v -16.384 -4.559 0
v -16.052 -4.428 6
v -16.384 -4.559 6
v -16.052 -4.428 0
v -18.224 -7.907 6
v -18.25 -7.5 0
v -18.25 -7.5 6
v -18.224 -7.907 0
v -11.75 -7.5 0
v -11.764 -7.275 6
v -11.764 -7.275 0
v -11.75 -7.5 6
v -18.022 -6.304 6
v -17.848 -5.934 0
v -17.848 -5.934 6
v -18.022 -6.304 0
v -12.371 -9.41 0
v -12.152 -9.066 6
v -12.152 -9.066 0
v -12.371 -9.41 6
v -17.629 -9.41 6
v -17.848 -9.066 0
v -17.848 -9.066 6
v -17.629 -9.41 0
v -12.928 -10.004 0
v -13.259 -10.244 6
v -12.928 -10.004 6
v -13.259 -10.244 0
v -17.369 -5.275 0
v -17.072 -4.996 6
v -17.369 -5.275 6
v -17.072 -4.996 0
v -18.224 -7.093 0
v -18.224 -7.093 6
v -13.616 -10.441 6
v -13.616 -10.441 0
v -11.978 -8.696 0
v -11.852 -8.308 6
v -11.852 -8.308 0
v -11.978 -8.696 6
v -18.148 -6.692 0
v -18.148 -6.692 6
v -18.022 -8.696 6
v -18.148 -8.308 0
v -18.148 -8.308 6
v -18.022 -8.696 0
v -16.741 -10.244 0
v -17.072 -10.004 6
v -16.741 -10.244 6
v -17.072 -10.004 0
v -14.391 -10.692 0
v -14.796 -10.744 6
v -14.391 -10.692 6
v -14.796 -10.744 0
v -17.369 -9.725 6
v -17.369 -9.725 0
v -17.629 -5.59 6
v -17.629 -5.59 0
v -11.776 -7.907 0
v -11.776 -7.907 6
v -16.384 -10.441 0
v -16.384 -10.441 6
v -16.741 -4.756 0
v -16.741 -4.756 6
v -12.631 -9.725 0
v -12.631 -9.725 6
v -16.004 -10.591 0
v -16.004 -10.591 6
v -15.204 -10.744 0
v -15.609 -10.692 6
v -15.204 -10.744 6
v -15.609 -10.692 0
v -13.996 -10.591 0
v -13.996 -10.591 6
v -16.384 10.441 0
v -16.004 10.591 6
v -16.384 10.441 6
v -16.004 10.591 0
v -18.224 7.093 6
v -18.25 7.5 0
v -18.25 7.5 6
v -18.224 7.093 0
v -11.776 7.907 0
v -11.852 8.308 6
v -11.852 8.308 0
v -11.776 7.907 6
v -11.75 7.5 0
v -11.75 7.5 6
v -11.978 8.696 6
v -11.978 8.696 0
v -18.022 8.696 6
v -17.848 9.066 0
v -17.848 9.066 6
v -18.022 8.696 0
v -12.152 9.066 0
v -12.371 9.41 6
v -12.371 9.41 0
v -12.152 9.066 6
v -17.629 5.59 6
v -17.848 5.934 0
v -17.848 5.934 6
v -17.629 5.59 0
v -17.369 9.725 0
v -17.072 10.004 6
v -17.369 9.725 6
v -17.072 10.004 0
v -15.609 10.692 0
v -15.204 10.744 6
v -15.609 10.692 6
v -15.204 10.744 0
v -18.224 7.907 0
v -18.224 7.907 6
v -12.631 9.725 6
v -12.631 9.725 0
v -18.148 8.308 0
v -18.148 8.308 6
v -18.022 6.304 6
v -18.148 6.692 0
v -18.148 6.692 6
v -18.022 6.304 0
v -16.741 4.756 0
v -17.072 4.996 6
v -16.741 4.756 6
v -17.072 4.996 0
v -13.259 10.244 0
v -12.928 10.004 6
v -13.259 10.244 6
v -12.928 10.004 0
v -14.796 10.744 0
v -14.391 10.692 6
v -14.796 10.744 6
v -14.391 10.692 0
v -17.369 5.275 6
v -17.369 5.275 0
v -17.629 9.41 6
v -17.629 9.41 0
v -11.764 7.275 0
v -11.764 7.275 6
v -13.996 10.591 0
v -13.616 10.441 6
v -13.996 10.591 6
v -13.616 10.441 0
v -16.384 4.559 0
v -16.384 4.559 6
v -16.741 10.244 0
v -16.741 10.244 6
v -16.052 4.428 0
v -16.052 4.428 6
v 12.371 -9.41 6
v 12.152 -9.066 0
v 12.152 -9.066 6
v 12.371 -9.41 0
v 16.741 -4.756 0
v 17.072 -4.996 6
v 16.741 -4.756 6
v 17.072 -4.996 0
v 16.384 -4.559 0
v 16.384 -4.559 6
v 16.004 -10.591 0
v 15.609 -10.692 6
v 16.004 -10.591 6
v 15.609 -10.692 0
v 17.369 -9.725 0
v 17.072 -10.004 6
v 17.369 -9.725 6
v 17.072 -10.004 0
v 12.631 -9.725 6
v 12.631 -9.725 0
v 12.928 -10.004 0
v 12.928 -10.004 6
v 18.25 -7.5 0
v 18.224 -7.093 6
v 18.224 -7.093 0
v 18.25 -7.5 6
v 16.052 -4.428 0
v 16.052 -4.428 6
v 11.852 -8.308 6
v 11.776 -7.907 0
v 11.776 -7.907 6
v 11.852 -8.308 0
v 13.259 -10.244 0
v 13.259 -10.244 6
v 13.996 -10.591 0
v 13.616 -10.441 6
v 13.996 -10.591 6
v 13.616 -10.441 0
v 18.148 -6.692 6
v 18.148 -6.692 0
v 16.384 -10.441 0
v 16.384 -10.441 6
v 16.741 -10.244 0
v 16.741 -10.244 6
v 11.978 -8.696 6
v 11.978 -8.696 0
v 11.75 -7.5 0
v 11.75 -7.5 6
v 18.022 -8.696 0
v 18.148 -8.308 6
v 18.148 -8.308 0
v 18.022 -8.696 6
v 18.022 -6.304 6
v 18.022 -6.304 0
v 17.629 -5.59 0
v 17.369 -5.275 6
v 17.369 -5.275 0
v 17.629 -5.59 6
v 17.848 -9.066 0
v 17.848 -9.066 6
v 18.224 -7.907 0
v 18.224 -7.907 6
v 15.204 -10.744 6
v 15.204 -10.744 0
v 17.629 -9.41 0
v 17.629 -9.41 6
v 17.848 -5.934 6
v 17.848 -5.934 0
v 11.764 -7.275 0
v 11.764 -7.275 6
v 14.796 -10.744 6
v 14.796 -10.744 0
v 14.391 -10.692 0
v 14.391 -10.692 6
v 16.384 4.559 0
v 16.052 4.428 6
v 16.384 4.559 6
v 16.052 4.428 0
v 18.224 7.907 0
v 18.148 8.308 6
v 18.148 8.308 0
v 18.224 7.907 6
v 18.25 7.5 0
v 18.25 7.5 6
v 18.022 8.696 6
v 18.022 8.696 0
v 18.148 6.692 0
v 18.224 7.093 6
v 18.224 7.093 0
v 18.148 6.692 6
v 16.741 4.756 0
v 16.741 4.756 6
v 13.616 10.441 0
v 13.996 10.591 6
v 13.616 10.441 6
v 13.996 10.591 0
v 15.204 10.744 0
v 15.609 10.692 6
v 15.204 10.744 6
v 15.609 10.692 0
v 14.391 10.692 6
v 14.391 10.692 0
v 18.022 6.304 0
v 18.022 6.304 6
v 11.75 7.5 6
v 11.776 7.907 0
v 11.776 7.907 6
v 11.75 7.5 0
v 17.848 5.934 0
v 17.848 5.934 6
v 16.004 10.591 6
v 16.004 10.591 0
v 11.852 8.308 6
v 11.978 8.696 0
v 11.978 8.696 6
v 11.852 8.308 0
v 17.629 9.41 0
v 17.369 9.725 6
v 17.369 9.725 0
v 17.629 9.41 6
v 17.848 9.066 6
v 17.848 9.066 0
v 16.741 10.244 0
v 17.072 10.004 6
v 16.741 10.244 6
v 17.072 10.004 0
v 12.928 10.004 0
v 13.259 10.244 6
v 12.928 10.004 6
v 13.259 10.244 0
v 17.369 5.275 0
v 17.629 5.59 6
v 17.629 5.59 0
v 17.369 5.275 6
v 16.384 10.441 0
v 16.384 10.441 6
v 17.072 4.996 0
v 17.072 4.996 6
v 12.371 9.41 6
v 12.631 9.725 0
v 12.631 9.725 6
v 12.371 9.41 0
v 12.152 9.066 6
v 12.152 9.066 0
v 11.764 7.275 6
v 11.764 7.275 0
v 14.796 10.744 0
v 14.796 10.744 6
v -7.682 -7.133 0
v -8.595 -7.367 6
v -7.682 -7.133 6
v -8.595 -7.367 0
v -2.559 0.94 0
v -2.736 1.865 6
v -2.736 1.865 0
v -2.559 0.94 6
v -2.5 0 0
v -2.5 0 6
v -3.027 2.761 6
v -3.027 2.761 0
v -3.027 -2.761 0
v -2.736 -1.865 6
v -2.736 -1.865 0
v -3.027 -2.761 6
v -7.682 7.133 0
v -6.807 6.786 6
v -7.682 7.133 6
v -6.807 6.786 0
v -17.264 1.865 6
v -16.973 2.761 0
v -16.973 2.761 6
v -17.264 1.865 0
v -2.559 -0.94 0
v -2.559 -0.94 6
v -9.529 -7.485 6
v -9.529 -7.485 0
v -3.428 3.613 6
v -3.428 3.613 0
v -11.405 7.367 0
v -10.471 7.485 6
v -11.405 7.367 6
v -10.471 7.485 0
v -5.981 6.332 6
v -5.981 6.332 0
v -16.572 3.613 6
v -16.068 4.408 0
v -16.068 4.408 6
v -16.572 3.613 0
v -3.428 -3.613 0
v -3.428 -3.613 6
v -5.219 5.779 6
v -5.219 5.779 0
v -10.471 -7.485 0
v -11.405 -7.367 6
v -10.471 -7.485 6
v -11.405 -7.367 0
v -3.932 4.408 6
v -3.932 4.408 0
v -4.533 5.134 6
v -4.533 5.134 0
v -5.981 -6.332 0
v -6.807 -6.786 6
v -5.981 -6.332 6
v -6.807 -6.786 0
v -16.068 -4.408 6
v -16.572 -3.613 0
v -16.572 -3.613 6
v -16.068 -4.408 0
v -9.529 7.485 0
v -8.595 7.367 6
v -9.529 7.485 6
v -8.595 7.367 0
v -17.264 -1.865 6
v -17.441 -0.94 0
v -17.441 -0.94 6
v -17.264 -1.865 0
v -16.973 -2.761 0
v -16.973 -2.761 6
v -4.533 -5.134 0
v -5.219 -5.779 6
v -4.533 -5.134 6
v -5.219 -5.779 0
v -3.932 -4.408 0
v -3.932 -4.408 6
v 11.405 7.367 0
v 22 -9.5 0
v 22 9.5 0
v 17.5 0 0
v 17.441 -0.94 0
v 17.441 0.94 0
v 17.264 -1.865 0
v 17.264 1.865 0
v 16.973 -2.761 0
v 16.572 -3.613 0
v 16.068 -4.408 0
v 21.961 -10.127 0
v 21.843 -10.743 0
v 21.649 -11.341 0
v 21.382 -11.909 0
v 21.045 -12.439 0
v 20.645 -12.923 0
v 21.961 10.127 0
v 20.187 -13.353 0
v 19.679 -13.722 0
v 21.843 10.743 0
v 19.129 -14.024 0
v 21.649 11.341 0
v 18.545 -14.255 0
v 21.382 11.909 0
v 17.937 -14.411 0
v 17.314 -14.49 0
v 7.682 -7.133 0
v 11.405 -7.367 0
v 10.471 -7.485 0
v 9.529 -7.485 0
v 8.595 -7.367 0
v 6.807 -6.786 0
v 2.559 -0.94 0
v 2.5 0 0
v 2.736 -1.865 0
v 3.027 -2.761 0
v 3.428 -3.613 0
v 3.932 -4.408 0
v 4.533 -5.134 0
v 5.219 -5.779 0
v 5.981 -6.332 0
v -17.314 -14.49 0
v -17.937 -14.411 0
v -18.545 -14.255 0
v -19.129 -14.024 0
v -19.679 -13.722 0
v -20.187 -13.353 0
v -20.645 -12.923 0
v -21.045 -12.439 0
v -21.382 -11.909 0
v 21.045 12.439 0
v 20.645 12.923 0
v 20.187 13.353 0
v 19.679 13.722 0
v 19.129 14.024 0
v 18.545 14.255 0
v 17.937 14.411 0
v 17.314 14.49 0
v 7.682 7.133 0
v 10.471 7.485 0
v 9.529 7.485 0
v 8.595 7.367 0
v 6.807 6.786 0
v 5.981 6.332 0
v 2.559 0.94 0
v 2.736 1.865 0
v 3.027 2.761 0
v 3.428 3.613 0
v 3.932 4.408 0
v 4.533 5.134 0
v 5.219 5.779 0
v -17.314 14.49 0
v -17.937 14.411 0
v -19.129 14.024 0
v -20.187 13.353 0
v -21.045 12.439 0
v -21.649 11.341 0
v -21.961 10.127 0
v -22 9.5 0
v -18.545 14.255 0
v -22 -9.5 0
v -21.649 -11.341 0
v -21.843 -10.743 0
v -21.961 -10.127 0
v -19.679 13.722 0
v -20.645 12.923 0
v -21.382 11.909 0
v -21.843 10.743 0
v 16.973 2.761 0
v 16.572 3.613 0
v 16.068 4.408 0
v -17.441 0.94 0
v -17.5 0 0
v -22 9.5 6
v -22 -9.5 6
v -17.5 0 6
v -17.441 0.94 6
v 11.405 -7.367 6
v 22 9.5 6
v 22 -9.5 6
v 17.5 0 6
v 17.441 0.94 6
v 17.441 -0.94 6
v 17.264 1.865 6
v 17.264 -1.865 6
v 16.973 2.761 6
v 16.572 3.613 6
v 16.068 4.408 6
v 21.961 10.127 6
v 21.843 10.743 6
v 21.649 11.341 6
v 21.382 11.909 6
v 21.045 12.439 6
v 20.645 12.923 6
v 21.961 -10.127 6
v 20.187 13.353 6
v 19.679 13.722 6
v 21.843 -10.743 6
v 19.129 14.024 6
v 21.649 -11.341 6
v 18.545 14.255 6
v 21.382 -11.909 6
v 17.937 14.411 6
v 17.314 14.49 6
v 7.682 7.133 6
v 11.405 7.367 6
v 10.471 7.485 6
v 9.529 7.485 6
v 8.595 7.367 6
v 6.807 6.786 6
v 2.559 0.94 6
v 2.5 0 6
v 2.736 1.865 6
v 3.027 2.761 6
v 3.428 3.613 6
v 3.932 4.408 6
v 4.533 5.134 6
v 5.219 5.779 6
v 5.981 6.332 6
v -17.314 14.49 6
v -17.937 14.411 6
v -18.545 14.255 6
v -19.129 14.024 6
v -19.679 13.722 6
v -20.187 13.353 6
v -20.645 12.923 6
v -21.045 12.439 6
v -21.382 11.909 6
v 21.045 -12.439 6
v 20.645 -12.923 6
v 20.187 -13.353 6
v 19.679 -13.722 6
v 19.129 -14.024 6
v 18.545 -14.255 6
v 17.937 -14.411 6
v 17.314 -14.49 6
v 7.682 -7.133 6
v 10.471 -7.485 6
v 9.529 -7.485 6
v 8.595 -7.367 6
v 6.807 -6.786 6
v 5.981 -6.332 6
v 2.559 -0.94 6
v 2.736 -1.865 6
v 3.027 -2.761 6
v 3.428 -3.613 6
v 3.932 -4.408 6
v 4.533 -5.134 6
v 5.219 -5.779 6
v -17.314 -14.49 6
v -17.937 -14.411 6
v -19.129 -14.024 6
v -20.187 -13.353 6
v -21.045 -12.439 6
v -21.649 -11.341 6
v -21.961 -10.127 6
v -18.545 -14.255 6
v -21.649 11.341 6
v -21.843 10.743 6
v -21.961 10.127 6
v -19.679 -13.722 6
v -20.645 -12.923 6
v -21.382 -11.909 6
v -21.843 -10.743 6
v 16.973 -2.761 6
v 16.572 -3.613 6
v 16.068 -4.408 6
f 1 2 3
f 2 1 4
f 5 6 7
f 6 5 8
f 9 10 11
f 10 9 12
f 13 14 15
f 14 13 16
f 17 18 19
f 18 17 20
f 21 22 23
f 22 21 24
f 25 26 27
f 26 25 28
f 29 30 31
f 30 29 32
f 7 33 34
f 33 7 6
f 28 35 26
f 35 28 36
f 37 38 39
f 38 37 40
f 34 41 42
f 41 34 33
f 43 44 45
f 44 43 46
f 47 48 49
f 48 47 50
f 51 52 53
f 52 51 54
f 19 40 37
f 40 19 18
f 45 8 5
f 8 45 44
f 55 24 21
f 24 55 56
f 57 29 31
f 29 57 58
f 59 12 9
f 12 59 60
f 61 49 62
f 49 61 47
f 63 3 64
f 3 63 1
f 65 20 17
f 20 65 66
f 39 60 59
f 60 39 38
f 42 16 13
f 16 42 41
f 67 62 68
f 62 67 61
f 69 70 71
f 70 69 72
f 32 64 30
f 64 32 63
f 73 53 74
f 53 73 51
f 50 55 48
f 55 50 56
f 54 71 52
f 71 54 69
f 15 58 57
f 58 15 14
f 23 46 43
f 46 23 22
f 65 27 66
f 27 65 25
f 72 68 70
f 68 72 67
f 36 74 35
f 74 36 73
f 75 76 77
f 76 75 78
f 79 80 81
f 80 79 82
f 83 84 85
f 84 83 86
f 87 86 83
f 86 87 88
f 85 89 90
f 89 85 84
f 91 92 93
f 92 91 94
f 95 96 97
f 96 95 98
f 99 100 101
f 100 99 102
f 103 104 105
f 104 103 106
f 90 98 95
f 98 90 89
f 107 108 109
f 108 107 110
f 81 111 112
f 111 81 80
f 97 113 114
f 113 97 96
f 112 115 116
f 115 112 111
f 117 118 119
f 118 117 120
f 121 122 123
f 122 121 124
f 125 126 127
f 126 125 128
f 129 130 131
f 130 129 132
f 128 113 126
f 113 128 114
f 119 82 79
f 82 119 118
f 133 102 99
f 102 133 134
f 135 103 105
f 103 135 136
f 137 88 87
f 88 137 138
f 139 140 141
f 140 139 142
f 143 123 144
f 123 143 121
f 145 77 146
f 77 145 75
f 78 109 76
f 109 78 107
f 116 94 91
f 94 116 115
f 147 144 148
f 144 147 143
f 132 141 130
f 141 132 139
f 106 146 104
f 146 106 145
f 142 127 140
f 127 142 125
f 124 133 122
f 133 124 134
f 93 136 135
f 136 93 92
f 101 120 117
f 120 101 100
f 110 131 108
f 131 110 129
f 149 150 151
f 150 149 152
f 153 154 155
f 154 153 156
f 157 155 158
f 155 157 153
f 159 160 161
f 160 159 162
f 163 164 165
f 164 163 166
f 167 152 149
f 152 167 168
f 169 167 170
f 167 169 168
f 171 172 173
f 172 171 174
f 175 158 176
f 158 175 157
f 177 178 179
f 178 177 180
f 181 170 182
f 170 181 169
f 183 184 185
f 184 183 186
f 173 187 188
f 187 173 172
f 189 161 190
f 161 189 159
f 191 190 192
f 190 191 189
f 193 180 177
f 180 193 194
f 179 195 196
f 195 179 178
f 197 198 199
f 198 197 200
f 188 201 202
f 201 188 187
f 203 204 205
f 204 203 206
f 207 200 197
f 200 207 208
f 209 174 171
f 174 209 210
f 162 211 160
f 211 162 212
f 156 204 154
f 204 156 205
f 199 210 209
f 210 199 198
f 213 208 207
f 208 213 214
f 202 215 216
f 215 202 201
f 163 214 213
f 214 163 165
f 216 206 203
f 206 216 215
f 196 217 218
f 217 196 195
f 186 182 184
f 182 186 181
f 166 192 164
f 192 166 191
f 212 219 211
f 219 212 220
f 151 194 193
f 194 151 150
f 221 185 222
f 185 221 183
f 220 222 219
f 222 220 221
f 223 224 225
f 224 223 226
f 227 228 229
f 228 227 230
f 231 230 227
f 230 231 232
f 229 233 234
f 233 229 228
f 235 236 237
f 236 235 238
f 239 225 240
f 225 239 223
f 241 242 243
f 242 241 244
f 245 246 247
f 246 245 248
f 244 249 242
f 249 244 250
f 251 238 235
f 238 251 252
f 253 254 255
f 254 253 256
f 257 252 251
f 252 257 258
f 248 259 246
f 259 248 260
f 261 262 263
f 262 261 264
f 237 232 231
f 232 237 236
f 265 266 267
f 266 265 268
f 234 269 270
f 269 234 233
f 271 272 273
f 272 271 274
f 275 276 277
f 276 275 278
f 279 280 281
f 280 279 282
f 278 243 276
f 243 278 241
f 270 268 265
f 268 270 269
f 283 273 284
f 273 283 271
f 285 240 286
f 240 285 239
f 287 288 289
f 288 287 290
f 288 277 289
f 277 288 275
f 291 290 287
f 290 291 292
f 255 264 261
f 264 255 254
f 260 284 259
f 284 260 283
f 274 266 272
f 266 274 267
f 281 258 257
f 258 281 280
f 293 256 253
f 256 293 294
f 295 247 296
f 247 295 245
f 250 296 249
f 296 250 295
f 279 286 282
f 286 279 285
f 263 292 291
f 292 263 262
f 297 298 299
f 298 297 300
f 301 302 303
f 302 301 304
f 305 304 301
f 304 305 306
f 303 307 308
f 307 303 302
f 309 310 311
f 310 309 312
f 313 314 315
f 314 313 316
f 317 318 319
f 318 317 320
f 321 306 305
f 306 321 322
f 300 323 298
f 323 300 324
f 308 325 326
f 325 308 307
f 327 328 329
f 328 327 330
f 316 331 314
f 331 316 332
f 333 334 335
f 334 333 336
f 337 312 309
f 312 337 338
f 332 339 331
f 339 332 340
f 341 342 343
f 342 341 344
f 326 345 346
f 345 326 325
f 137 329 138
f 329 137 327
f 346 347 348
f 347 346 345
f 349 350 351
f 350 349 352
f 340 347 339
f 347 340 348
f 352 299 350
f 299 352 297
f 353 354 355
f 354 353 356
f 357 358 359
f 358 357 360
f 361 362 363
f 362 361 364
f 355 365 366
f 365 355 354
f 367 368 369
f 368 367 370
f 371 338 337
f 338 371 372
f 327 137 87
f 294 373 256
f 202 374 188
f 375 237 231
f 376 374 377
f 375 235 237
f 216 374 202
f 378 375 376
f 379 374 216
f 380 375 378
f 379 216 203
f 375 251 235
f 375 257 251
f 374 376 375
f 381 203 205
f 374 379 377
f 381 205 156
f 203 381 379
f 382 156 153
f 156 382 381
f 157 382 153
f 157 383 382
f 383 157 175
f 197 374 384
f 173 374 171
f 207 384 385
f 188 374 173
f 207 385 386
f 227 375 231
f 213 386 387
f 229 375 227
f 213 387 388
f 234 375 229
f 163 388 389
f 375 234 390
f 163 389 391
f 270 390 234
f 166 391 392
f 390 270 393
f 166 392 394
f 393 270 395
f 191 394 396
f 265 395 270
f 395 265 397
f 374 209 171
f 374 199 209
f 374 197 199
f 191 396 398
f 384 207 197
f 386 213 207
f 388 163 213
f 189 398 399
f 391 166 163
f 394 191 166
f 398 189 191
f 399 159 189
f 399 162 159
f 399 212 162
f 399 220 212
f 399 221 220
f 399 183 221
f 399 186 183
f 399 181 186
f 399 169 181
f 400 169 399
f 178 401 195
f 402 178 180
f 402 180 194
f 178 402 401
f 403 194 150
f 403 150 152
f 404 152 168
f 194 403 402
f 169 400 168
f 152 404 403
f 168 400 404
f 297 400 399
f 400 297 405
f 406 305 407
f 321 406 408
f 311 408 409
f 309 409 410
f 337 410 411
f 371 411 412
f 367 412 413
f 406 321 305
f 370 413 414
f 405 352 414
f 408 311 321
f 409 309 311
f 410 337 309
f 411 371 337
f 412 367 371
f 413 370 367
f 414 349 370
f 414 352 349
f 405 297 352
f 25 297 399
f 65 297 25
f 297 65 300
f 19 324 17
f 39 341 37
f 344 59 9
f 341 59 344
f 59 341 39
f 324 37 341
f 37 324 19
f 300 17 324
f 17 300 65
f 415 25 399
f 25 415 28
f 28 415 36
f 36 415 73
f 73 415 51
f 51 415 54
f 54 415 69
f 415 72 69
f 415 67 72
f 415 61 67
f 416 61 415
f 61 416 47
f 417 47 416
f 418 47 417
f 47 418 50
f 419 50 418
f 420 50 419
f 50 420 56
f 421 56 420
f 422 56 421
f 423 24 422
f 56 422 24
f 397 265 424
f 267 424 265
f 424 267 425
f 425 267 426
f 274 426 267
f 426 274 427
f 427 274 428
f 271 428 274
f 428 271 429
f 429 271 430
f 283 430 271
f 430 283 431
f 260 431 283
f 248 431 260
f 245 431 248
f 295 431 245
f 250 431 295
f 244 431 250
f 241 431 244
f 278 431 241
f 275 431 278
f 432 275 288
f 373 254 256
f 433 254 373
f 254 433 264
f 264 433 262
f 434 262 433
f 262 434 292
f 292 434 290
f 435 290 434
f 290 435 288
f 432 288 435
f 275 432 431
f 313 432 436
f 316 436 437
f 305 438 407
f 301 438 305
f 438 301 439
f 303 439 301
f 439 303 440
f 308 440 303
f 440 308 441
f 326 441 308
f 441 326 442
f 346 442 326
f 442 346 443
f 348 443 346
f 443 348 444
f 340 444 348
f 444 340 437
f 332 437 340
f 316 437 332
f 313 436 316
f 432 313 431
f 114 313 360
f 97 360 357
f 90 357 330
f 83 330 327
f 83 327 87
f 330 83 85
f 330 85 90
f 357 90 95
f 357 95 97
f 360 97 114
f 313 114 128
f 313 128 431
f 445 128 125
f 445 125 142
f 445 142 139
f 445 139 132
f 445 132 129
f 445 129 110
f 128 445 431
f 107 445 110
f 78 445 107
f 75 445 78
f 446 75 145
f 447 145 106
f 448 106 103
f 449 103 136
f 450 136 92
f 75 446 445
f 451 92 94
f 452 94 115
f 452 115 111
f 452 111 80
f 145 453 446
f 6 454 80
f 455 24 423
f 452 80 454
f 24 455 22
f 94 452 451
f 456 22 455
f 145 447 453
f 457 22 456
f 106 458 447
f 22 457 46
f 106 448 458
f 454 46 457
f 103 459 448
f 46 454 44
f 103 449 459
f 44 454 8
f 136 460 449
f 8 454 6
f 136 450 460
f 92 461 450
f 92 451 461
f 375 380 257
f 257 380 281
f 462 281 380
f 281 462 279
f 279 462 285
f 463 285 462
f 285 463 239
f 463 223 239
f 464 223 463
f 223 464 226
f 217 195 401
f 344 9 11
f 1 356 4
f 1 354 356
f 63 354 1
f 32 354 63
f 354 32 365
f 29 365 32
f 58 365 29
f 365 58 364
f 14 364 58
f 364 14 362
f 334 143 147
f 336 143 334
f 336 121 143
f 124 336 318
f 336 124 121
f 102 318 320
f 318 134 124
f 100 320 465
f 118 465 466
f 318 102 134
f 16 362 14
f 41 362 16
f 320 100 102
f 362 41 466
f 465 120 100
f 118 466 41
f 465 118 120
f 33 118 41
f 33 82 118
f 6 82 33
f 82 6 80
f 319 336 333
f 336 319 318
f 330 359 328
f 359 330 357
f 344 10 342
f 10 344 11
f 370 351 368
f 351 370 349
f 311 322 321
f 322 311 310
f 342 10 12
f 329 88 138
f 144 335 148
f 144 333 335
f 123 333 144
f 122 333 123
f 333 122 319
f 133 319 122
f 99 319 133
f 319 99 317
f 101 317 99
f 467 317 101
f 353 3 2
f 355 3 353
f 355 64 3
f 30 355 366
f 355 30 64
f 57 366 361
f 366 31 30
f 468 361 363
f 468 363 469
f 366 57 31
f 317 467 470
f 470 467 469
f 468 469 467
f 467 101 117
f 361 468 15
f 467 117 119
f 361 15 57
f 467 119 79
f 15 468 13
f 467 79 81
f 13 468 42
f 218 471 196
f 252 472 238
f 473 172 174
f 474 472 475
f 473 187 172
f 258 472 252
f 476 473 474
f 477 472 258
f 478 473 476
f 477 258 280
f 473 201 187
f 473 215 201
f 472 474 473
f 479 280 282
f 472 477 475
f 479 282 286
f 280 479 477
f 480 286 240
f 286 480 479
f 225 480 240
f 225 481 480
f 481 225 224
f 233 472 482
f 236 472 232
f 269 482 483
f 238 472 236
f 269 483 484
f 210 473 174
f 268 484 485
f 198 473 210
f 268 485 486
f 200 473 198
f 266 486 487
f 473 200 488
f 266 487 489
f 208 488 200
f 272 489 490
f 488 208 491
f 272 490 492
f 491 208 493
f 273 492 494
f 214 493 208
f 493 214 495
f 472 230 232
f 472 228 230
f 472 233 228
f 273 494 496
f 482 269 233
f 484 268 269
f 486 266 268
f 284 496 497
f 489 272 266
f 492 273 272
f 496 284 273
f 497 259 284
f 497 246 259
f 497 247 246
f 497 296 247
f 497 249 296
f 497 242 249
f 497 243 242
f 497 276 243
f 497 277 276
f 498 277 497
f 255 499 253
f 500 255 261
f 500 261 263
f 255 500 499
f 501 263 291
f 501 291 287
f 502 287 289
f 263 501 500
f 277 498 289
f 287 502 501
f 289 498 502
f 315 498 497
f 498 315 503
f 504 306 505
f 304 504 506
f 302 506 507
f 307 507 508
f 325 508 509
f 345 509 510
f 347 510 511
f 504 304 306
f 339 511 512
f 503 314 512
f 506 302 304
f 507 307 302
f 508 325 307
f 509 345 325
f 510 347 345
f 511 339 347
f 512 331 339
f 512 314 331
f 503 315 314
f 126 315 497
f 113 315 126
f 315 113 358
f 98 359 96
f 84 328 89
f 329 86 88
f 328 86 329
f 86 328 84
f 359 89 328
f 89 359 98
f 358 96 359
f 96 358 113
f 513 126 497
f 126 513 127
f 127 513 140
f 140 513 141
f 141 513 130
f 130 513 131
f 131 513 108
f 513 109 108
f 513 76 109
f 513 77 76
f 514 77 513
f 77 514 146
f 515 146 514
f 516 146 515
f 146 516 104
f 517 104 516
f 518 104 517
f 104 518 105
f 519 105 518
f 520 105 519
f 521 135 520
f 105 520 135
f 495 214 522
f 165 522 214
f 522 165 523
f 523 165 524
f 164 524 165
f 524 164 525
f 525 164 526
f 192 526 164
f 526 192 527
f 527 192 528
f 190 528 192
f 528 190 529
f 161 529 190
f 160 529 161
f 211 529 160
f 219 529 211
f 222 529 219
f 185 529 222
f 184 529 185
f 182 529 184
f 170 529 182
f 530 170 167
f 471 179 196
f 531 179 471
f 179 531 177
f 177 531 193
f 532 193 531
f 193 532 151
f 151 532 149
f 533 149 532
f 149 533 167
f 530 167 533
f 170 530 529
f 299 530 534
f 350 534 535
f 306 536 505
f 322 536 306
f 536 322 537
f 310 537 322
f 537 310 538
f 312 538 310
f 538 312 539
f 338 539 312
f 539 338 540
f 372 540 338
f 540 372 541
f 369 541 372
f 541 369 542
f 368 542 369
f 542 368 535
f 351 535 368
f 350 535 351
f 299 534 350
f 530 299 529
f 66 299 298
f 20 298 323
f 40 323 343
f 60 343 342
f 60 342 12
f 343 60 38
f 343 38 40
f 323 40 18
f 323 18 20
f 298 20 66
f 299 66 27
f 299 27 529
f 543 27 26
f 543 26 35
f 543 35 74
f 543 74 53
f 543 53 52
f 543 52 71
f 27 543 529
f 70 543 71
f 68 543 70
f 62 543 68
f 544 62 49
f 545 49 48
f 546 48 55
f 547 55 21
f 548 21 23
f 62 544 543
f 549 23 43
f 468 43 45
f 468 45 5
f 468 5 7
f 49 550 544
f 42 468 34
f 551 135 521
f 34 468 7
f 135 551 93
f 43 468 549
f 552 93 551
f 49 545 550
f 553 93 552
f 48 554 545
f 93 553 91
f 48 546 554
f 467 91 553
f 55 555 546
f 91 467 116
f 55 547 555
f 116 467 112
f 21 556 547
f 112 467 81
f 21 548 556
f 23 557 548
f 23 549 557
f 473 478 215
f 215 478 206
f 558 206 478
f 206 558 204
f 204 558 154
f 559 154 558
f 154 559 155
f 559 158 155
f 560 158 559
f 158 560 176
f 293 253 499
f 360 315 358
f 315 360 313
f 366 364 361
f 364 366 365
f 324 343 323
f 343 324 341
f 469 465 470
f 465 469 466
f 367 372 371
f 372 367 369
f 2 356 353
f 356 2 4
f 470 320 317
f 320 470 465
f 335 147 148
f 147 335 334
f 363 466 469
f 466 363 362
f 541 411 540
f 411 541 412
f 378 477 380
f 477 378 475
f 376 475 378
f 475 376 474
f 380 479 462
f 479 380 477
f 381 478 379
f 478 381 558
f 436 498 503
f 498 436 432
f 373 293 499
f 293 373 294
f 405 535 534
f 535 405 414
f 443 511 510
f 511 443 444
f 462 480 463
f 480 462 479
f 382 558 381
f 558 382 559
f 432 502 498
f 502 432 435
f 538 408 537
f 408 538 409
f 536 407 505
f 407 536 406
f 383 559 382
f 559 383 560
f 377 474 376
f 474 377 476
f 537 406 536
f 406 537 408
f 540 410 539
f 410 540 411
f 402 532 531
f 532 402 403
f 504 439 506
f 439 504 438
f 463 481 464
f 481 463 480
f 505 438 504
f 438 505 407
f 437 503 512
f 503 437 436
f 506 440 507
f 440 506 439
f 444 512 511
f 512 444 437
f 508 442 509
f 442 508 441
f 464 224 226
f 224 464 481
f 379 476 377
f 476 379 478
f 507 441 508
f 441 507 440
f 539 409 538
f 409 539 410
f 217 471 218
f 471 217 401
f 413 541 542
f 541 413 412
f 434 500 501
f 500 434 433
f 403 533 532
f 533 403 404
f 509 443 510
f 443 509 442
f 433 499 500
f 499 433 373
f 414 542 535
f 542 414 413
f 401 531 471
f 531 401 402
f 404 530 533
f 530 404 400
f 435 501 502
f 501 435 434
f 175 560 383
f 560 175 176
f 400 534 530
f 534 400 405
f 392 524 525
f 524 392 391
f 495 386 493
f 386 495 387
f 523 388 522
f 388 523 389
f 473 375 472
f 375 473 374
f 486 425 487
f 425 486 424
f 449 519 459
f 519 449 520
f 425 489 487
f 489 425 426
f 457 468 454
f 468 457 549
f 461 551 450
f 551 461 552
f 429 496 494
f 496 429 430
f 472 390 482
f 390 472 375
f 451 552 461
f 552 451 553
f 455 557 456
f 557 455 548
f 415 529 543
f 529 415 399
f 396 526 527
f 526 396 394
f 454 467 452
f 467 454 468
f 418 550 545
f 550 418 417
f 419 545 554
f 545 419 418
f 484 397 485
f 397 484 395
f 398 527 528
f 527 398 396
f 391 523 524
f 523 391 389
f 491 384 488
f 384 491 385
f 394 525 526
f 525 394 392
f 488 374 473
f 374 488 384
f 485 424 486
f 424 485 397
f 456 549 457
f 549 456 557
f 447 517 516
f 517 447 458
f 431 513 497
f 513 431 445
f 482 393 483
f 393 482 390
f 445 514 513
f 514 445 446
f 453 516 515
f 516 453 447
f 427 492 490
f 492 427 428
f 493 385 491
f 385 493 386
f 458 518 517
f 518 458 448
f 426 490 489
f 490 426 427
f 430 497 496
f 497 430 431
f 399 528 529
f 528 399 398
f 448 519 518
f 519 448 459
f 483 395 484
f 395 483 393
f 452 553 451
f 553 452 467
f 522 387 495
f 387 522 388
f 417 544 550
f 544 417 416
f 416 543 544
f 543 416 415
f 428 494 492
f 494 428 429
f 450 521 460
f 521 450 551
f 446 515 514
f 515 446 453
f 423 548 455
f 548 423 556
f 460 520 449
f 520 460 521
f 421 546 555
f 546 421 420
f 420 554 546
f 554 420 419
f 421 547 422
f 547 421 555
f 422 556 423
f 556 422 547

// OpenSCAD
$fn = 50;


difference() {
	union() {
		hull() {
			translate(v = [-17.0000000000, 9.5000000000, 0]) {
				cylinder(h = 6, r = 5);
			}
			translate(v = [17.0000000000, 9.5000000000, 0]) {
				cylinder(h = 6, r = 5);
			}
			translate(v = [-17.0000000000, -9.5000000000, 0]) {
				cylinder(h = 6, r = 5);
			}
			translate(v = [17.0000000000, -9.5000000000, 0]) {
				cylinder(h = 6, r = 5);
			}
		}
	}
	union() {
		#translate(v = [-15.0000000000, -7.5000000000, -100.0000000000]) {
			cylinder(h = 200, r = 3.2500000000);
		}
		#translate(v = [-15.0000000000, 7.5000000000, -100.0000000000]) {
			cylinder(h = 200, r = 3.2500000000);
		}
		#translate(v = [15.0000000000, -7.5000000000, -100.0000000000]) {
			cylinder(h = 200, r = 3.2500000000);
		}
		#translate(v = [15.0000000000, 7.5000000000, -100.0000000000]) {
			cylinder(h = 200, r = 3.2500000000);
		}
		#translate(v = [-10.0000000000, 0, 0]) {
			cylinder(h = 6, r = 7.5000000000);
		}
		#translate(v = [10.0000000000, 0, 0]) {
			cylinder(h = 6, r = 7.5000000000);
		}
	}
}
